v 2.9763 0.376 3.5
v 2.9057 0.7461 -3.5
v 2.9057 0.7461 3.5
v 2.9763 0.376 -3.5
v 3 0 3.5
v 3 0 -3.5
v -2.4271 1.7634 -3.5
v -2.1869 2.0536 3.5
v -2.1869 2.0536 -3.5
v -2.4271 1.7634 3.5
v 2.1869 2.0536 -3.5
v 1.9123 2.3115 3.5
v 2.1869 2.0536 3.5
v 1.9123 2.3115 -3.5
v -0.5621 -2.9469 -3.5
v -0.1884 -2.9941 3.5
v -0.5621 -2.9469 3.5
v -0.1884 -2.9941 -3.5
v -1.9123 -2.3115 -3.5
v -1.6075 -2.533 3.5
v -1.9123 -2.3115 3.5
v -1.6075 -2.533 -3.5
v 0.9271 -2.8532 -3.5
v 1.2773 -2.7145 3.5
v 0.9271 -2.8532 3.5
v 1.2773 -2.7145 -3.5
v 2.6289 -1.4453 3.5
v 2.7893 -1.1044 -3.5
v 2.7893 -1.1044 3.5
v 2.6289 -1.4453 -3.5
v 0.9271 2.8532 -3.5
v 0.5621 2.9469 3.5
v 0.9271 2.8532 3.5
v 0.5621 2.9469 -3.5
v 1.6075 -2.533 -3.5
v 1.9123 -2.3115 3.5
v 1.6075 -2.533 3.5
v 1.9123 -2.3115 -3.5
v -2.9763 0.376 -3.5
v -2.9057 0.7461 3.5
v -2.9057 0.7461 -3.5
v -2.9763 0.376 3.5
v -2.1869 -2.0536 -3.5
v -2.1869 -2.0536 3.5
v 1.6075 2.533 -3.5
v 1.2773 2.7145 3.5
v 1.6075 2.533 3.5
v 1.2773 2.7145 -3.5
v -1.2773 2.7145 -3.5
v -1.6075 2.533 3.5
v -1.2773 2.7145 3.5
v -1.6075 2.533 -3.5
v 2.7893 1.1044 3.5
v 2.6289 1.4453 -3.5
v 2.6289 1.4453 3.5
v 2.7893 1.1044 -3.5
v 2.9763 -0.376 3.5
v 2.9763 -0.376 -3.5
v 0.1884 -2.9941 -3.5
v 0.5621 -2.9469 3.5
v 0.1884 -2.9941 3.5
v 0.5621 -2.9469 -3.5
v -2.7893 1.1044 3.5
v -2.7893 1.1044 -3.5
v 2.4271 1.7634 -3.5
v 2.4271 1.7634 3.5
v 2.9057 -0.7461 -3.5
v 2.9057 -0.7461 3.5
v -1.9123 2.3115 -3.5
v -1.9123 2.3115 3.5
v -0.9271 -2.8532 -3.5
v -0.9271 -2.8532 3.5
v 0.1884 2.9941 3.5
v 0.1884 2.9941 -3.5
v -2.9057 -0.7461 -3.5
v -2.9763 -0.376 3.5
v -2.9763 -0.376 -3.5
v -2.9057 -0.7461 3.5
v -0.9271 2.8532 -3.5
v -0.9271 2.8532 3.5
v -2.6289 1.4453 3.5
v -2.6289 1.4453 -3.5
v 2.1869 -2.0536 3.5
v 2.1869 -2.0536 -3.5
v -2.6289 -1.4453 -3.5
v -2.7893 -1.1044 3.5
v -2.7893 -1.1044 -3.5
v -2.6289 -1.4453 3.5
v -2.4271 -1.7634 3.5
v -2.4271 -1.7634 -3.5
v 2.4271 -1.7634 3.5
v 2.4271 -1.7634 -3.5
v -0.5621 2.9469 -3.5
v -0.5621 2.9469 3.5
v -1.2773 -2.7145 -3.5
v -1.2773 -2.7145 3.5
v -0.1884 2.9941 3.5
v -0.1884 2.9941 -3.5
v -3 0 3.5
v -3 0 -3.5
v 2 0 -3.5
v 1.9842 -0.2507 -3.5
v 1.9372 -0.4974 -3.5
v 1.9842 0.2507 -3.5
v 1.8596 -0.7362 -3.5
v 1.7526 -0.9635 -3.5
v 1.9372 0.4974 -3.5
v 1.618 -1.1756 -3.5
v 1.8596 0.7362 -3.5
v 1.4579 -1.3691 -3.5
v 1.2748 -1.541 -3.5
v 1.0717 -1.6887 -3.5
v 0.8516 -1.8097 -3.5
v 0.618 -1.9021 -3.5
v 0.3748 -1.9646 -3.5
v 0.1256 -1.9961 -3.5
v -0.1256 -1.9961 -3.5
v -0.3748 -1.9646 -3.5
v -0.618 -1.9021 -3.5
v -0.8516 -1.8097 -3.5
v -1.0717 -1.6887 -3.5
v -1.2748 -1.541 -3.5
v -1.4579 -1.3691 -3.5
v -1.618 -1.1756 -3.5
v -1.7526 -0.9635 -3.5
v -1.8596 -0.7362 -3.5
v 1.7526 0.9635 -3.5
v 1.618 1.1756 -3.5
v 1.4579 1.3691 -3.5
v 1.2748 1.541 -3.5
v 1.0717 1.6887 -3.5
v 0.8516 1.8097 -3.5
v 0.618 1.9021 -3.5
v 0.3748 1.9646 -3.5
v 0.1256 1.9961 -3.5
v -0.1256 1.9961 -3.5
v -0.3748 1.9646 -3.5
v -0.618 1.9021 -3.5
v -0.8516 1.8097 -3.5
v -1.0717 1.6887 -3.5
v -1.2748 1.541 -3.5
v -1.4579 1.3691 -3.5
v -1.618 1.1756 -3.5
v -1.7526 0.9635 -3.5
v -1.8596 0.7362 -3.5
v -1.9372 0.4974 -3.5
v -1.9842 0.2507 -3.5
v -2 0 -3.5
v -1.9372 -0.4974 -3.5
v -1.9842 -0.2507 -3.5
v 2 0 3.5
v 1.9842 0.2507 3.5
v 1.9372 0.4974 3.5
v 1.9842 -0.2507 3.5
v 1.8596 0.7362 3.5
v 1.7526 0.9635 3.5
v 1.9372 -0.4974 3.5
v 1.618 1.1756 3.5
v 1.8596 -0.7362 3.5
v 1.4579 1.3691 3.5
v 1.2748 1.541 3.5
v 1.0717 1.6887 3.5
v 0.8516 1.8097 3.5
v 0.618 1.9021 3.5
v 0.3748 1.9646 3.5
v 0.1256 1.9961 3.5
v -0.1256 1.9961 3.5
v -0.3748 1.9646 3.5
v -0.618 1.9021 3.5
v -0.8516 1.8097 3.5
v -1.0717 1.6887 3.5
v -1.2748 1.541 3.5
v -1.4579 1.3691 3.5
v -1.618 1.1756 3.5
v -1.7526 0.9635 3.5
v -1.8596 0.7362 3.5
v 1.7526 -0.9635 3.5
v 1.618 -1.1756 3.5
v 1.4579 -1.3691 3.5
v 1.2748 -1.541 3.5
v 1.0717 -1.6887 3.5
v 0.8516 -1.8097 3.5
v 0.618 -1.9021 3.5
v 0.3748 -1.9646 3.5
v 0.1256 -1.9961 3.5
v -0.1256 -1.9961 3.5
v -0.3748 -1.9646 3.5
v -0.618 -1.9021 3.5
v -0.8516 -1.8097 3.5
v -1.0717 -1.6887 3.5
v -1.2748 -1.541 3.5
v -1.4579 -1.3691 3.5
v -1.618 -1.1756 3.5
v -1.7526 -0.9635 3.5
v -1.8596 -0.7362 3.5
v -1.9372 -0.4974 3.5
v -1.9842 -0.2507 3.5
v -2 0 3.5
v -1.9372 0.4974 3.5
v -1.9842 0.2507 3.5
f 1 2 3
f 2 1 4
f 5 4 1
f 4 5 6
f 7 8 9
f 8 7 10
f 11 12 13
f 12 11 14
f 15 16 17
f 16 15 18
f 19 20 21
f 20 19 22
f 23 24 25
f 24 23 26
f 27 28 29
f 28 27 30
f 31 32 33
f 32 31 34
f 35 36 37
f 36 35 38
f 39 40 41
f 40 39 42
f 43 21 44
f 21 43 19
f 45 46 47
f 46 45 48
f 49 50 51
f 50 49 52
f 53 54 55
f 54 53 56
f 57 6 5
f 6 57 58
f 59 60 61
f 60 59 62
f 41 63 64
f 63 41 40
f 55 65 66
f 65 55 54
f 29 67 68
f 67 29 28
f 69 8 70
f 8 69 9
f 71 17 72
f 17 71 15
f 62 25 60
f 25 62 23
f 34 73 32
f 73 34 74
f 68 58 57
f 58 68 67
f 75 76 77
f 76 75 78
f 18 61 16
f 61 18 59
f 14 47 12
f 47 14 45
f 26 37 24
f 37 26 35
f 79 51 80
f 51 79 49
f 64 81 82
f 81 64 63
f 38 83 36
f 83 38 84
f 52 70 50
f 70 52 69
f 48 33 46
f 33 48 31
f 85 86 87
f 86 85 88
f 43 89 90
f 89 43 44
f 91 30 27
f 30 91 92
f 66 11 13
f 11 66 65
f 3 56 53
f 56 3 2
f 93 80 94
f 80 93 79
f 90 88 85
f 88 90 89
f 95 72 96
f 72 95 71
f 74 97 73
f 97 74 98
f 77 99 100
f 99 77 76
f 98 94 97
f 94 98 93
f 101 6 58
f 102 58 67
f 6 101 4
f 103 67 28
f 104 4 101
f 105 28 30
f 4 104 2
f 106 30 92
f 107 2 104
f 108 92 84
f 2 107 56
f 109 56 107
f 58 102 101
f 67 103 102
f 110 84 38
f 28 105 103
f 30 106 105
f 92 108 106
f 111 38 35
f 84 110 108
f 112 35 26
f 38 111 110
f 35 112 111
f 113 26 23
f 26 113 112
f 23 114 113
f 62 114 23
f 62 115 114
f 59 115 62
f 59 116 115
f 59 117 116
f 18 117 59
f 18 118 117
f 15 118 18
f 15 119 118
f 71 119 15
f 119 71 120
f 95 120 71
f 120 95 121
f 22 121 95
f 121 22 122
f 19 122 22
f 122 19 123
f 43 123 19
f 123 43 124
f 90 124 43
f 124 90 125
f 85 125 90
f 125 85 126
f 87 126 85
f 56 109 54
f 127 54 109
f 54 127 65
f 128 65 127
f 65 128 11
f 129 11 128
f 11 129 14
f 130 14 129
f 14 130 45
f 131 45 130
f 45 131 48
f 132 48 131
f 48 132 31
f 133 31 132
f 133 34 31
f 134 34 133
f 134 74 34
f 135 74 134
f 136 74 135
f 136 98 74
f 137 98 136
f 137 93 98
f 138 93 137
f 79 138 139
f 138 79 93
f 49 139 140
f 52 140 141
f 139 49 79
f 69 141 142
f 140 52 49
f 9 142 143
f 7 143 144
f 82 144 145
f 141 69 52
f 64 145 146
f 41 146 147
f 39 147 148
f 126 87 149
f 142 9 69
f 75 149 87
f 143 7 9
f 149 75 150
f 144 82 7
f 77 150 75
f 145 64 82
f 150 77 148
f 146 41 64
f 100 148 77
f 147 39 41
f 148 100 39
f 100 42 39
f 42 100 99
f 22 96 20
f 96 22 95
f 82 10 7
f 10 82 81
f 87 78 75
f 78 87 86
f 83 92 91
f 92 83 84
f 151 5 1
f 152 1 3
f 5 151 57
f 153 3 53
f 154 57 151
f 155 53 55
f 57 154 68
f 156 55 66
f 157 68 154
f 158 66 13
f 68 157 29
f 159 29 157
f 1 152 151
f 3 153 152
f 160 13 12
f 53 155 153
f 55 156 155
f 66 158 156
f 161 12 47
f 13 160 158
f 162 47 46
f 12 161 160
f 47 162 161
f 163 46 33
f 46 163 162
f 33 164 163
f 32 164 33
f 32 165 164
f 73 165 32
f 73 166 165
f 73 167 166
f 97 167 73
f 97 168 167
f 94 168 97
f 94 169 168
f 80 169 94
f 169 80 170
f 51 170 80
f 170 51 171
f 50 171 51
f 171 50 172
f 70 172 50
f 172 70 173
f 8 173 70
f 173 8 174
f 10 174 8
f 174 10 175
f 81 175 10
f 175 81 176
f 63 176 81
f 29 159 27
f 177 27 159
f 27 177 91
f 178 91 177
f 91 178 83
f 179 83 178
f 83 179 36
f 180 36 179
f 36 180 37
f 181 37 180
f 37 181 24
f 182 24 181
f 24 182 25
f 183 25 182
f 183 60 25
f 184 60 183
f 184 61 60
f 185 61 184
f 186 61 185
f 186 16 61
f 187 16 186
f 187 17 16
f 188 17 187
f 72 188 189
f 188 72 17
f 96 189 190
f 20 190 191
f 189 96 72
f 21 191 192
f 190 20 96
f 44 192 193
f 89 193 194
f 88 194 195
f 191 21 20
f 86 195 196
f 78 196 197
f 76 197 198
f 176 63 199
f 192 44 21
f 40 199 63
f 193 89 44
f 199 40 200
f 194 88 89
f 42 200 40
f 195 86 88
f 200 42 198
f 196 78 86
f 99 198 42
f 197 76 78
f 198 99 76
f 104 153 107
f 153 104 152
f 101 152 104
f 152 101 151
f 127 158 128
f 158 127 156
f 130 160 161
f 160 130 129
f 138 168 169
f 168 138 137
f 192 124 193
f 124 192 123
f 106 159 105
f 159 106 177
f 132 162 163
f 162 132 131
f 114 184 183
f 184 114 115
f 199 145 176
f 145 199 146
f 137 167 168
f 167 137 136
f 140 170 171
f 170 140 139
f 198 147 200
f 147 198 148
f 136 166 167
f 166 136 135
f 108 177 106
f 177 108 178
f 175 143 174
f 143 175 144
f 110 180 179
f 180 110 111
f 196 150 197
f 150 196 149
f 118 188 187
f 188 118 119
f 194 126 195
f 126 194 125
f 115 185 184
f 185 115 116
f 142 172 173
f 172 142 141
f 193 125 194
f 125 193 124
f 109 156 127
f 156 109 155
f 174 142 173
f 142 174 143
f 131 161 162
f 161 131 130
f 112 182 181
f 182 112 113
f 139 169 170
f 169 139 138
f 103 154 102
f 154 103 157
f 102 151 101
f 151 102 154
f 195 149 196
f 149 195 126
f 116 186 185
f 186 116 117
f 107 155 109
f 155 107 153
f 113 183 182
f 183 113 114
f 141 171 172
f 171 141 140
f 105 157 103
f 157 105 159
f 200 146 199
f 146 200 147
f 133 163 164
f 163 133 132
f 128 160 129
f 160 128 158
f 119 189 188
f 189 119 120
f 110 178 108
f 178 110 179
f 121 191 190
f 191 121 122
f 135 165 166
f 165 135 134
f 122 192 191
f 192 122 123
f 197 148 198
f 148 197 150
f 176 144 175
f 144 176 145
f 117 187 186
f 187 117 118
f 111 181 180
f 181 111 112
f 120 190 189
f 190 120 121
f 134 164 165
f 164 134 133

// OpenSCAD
$fn = 50;


difference() {
	union() {
		translate(v = [0, 0, -3.5000000000]) {
			cylinder(h = 7, r = 3.0000000000);
		}
	}
	union() {
		translate(v = [0, 0, -100.0000000000]) {
			cylinder(h = 200, r = 2.0000000000);
		}
	}
}
